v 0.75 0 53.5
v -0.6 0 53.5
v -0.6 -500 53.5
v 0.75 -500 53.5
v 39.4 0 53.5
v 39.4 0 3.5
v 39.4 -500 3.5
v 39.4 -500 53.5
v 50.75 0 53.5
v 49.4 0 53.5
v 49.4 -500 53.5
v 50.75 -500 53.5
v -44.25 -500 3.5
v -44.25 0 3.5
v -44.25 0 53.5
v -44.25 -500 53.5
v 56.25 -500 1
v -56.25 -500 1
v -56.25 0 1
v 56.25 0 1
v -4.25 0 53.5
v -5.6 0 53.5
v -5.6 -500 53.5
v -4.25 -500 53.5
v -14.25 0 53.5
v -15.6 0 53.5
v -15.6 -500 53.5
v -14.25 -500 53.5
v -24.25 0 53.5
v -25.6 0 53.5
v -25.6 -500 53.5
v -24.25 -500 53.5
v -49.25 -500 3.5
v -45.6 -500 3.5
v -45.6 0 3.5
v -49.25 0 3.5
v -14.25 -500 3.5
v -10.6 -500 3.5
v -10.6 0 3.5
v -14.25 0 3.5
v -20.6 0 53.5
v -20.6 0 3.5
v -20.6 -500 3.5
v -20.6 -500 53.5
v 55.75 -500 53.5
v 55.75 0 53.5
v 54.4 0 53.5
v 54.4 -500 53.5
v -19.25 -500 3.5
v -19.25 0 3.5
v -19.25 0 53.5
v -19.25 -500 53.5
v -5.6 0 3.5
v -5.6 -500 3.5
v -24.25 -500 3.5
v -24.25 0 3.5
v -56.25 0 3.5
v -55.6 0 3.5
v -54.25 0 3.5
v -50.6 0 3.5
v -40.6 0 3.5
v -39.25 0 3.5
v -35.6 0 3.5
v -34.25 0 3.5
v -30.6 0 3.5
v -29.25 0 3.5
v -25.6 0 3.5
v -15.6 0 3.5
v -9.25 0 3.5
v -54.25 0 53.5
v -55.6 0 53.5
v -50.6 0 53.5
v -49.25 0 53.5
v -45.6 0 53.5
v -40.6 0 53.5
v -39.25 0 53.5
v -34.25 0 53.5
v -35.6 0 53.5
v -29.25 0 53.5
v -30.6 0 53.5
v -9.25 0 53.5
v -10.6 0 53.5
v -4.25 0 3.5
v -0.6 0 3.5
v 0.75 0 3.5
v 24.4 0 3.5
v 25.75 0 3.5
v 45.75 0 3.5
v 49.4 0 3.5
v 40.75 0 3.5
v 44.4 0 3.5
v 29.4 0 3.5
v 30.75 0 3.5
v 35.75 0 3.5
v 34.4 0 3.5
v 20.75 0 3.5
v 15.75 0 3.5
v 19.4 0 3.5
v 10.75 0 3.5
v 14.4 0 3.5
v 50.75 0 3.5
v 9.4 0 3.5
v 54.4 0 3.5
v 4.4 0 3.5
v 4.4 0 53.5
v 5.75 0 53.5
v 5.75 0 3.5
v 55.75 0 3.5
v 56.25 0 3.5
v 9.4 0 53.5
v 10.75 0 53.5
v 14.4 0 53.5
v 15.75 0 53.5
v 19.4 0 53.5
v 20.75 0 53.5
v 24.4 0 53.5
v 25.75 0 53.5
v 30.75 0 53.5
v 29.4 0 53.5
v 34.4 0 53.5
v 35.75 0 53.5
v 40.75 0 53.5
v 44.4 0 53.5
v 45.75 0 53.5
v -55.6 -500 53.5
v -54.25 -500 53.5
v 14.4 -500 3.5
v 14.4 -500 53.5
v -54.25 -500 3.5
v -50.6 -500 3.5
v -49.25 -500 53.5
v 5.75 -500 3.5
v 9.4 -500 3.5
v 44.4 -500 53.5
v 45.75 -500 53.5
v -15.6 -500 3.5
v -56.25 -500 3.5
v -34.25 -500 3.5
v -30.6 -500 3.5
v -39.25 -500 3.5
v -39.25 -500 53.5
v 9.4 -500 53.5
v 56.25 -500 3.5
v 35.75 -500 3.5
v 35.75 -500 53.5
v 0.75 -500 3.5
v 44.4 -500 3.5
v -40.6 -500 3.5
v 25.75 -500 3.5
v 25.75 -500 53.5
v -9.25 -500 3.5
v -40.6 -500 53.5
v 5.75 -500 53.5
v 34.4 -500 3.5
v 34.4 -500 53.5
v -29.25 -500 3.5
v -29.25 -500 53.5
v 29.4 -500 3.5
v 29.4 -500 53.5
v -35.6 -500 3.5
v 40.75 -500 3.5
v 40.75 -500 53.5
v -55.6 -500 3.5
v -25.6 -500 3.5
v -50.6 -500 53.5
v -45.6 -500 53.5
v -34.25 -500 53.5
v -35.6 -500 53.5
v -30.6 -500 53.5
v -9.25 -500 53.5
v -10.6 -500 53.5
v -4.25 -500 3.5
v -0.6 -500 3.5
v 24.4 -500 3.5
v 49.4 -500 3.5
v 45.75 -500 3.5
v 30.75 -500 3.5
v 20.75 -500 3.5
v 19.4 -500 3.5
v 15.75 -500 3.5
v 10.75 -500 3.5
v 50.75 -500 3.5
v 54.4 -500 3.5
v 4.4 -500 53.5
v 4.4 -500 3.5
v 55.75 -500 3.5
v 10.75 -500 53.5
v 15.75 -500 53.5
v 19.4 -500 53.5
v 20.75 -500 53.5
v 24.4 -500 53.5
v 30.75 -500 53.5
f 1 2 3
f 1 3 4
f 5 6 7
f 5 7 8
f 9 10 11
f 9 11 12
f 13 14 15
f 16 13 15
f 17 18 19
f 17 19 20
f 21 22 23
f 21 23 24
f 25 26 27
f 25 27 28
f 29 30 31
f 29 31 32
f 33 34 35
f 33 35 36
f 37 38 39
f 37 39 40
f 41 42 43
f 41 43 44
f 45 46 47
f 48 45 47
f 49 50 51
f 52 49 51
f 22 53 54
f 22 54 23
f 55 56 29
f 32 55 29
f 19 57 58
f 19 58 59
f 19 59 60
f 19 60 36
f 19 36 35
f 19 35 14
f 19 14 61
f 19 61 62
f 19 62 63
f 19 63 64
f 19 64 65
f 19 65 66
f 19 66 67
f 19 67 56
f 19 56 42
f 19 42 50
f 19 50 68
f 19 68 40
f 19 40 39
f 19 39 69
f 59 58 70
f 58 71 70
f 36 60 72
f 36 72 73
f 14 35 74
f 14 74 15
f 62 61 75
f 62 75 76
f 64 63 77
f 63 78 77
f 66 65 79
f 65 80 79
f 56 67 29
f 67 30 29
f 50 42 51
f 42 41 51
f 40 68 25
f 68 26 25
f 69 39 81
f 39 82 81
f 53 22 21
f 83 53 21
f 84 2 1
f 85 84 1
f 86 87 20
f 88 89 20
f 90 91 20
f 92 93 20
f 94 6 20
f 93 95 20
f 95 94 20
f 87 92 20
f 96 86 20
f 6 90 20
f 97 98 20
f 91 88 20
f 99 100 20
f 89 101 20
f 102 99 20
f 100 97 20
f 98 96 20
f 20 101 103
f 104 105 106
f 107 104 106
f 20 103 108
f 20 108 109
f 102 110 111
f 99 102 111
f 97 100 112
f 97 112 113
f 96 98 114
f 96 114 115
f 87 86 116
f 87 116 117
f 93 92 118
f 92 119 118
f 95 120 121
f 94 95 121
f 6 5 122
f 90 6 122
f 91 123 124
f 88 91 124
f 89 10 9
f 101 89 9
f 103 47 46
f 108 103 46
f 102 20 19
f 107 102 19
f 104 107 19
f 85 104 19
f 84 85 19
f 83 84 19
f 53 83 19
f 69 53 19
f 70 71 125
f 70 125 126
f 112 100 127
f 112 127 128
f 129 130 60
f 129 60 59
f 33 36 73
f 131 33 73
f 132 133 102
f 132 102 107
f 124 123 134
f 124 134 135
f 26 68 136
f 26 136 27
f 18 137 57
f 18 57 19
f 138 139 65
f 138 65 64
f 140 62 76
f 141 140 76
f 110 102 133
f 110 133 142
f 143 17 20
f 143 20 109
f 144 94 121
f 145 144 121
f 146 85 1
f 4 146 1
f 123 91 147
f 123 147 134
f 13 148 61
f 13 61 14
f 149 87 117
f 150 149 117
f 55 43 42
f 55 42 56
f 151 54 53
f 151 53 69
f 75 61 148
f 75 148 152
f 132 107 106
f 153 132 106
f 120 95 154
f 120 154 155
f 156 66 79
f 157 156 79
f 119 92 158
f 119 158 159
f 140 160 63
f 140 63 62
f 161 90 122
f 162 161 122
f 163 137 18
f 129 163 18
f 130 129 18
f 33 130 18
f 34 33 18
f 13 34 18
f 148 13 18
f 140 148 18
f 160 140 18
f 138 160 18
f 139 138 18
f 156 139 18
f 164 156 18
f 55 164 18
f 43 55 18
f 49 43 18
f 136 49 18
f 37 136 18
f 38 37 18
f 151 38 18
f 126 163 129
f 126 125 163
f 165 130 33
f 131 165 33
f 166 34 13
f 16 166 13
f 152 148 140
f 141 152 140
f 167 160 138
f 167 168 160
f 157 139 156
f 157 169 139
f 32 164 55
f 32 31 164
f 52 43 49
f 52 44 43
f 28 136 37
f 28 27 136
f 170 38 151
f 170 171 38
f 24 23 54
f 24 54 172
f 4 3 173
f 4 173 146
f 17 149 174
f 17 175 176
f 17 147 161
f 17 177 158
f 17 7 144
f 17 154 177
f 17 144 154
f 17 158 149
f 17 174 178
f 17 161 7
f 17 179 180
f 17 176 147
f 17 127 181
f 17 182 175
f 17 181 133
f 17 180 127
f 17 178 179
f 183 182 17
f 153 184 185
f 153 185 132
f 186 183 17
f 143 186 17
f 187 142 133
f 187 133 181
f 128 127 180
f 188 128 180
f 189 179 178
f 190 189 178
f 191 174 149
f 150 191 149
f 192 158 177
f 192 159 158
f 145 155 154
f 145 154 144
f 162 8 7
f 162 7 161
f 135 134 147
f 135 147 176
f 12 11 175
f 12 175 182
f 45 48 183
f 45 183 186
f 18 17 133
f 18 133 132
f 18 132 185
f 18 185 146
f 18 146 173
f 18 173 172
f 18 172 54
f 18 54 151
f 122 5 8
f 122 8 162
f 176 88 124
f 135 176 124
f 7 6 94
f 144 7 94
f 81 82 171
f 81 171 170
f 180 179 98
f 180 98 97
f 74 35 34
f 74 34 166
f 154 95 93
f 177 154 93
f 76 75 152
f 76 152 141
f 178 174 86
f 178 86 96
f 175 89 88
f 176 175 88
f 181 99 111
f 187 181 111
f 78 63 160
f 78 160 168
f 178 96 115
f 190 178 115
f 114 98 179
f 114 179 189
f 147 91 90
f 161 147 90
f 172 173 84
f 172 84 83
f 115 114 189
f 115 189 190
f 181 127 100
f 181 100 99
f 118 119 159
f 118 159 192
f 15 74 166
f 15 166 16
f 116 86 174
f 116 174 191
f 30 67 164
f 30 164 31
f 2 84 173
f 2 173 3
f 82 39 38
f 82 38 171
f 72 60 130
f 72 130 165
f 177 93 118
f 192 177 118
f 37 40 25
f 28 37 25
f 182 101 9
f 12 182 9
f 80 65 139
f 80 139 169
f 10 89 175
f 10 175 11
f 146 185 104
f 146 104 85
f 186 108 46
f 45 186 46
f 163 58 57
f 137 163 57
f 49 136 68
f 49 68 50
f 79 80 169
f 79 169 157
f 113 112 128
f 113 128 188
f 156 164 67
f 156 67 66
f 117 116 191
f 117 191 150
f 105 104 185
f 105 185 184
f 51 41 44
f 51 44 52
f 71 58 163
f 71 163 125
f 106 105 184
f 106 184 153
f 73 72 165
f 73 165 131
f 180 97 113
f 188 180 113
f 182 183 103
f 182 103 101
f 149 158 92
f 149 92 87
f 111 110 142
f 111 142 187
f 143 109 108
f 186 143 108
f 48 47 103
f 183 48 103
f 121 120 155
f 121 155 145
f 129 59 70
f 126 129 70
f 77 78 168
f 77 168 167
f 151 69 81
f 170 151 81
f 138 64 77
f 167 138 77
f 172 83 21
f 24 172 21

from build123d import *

# Parameters (mm, degrees)
F0_W     = 1.35
F0_H     = 50
F1_DEPTH = 500


with BuildPart() as f1:
    # F0 (on Front) → F1 (new body)
    with BuildSketch(Plane.XZ):
        Polygon((0, 1), (56.25, 1), (56.25, 3.5), (55.75, 3.5), (55.75, 53.5), (54.4, 53.5), (54.4, 3.5), (50.75, 3.5), (49.4, 3.5), (45.75, 3.5), (44.4, 3.5), (40.75, 3.5), (39.4, 3.5), (35.75, 3.5), (34.4, 3.5), (30.75, 3.5), (29.4, 3.5), (25.75, 3.5), (24.4, 3.5), (20.75, 3.5), (19.4, 3.5), (15.75, 3.5), (14.4, 3.5), (10.75, 3.5), (9.4, 3.5), (5.75, 3.5), (4.4, 3.5), (0.75, 3.5), (-0.6, 3.5), (-4.25, 3.5), (-5.6, 3.5), (-9.25, 3.5), (-10.6, 3.5), (-14.25, 3.5), (-15.6, 3.5), (-19.25, 3.5), (-20.6, 3.5), (-24.25, 3.5), (-25.6, 3.5), (-29.25, 3.5), (-30.6, 3.5), (-34.25, 3.5), (-35.6, 3.5), (-39.25, 3.5), (-40.6, 3.5), (-44.25, 3.5), (-45.6, 3.5), (-49.25, 3.5), (-50.6, 3.5), (-52.25, 3.5), (-54.25, 3.5), (-55.6, 3.5), (-56.25, 3.5), (-56.25, 1), align=None)
        with Locations((-54.925, 28.5)):
            Rectangle(F0_W, F0_H)
        with Locations((50.075, 28.5)):
            Rectangle(F0_W, F0_H)
        with Locations((-49.925, 28.5)):
            Rectangle(F0_W, F0_H)
        with Locations((45.075, 28.5)):
            Rectangle(F0_W, F0_H)
        with Locations((-44.925, 28.5)):
            Rectangle(F0_W, F0_H)
        with Locations((40.075, 28.5)):
            Rectangle(F0_W, F0_H)
        with Locations((-39.925, 28.5)):
            Rectangle(F0_W, F0_H)
        with Locations((35.075, 28.5)):
            Rectangle(F0_W, F0_H)
        with Locations((-34.925, 28.5)):
            Rectangle(F0_W, F0_H)
        with Locations((30.075, 28.5)):
            Rectangle(F0_W, F0_H)
        with Locations((-29.925, 28.5)):
            Rectangle(F0_W, F0_H)
        with Locations((25.075, 28.5)):
            Rectangle(F0_W, F0_H)
        with Locations((-24.925, 28.5)):
            Rectangle(F0_W, F0_H)
        with Locations((20.075, 28.5)):
            Rectangle(F0_W, F0_H)
        with Locations((-19.925, 28.5)):
            Rectangle(F0_W, F0_H)
        with Locations((15.075, 28.5)):
            Rectangle(F0_W, F0_H)
        with Locations((-14.925, 28.5)):
            Rectangle(F0_W, F0_H)
        with Locations((10.075, 28.5)):
            Rectangle(F0_W, F0_H)
        with Locations((-9.925, 28.5)):
            Rectangle(F0_W, F0_H)
        with Locations((5.075, 28.5)):
            Rectangle(F0_W, F0_H)
        with Locations((-4.925, 28.5)):
            Rectangle(F0_W, F0_H)
        with Locations((0.075, 28.5)):
            Rectangle(F0_W, F0_H)
    extrude(amount=F1_DEPTH)


solid = f1.part
